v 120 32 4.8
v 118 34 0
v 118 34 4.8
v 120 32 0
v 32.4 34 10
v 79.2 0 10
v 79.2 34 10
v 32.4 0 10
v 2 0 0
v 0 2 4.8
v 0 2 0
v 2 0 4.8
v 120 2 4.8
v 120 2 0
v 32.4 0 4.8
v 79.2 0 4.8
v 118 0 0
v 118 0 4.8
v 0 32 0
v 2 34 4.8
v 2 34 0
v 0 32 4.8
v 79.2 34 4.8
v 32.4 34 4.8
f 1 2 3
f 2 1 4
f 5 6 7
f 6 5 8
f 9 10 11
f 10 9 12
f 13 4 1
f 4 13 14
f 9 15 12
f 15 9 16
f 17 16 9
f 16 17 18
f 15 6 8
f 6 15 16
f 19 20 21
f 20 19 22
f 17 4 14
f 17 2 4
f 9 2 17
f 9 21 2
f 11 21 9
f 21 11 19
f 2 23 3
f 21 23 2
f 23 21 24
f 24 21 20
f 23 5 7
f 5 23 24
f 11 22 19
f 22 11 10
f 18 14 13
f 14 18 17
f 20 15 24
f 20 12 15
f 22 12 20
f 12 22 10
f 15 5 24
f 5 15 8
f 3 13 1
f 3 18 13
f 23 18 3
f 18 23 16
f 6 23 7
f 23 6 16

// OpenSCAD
$fn = 32;

// ----------------------------------------------------------------------
// Stepped bar: centerstep, 120 x 34 x 10/4.8 mm
// ----------------------------------------------------------------------

// --- parameters (mm) ---
bar_l = 120;              // bar length, X
bar_w = 34;               // bar width, Y
plate_t = 10;             // thickness of the thick zone, Z
thin_t = 4.8;             // thickness of the thin zone
corner_c = 2;             // corner chamfer of the bar
step_cut = 5.2;           // material removed from the thin zone
thick_from = 32.4;        // start of the thick middle zone
thick_to = 79.2;          // end of the thick middle zone
depth_1 = 5.2;            // depth of cut 1 from the top face
depth_2 = 5.2;            // depth of cut 2 from the top face

profile = [[2, 0], [118, 0], [120, 2], [120, 32], [118, 34], [2, 34], [0, 32], [0, 2]];  // primary outline, 8 points, counter clockwise
void_1 = [[-1, -1], [32.4, -1], [32.4, 35], [-1, 35]];  // thin left end, 4 points
void_2 = [[79.2, -1], [121, -1], [121, 35], [79.2, 35]];  // thin right end, 4 points

// --- the one profile operation ---
difference() {
  linear_extrude(height = plate_t) polygon(points = profile);
  translate([0, 0, plate_t - depth_1])
    linear_extrude(height = depth_1 + 1) polygon(points = void_1);
  translate([0, 0, plate_t - depth_2])
    linear_extrude(height = depth_2 + 1) polygon(points = void_2);
}
